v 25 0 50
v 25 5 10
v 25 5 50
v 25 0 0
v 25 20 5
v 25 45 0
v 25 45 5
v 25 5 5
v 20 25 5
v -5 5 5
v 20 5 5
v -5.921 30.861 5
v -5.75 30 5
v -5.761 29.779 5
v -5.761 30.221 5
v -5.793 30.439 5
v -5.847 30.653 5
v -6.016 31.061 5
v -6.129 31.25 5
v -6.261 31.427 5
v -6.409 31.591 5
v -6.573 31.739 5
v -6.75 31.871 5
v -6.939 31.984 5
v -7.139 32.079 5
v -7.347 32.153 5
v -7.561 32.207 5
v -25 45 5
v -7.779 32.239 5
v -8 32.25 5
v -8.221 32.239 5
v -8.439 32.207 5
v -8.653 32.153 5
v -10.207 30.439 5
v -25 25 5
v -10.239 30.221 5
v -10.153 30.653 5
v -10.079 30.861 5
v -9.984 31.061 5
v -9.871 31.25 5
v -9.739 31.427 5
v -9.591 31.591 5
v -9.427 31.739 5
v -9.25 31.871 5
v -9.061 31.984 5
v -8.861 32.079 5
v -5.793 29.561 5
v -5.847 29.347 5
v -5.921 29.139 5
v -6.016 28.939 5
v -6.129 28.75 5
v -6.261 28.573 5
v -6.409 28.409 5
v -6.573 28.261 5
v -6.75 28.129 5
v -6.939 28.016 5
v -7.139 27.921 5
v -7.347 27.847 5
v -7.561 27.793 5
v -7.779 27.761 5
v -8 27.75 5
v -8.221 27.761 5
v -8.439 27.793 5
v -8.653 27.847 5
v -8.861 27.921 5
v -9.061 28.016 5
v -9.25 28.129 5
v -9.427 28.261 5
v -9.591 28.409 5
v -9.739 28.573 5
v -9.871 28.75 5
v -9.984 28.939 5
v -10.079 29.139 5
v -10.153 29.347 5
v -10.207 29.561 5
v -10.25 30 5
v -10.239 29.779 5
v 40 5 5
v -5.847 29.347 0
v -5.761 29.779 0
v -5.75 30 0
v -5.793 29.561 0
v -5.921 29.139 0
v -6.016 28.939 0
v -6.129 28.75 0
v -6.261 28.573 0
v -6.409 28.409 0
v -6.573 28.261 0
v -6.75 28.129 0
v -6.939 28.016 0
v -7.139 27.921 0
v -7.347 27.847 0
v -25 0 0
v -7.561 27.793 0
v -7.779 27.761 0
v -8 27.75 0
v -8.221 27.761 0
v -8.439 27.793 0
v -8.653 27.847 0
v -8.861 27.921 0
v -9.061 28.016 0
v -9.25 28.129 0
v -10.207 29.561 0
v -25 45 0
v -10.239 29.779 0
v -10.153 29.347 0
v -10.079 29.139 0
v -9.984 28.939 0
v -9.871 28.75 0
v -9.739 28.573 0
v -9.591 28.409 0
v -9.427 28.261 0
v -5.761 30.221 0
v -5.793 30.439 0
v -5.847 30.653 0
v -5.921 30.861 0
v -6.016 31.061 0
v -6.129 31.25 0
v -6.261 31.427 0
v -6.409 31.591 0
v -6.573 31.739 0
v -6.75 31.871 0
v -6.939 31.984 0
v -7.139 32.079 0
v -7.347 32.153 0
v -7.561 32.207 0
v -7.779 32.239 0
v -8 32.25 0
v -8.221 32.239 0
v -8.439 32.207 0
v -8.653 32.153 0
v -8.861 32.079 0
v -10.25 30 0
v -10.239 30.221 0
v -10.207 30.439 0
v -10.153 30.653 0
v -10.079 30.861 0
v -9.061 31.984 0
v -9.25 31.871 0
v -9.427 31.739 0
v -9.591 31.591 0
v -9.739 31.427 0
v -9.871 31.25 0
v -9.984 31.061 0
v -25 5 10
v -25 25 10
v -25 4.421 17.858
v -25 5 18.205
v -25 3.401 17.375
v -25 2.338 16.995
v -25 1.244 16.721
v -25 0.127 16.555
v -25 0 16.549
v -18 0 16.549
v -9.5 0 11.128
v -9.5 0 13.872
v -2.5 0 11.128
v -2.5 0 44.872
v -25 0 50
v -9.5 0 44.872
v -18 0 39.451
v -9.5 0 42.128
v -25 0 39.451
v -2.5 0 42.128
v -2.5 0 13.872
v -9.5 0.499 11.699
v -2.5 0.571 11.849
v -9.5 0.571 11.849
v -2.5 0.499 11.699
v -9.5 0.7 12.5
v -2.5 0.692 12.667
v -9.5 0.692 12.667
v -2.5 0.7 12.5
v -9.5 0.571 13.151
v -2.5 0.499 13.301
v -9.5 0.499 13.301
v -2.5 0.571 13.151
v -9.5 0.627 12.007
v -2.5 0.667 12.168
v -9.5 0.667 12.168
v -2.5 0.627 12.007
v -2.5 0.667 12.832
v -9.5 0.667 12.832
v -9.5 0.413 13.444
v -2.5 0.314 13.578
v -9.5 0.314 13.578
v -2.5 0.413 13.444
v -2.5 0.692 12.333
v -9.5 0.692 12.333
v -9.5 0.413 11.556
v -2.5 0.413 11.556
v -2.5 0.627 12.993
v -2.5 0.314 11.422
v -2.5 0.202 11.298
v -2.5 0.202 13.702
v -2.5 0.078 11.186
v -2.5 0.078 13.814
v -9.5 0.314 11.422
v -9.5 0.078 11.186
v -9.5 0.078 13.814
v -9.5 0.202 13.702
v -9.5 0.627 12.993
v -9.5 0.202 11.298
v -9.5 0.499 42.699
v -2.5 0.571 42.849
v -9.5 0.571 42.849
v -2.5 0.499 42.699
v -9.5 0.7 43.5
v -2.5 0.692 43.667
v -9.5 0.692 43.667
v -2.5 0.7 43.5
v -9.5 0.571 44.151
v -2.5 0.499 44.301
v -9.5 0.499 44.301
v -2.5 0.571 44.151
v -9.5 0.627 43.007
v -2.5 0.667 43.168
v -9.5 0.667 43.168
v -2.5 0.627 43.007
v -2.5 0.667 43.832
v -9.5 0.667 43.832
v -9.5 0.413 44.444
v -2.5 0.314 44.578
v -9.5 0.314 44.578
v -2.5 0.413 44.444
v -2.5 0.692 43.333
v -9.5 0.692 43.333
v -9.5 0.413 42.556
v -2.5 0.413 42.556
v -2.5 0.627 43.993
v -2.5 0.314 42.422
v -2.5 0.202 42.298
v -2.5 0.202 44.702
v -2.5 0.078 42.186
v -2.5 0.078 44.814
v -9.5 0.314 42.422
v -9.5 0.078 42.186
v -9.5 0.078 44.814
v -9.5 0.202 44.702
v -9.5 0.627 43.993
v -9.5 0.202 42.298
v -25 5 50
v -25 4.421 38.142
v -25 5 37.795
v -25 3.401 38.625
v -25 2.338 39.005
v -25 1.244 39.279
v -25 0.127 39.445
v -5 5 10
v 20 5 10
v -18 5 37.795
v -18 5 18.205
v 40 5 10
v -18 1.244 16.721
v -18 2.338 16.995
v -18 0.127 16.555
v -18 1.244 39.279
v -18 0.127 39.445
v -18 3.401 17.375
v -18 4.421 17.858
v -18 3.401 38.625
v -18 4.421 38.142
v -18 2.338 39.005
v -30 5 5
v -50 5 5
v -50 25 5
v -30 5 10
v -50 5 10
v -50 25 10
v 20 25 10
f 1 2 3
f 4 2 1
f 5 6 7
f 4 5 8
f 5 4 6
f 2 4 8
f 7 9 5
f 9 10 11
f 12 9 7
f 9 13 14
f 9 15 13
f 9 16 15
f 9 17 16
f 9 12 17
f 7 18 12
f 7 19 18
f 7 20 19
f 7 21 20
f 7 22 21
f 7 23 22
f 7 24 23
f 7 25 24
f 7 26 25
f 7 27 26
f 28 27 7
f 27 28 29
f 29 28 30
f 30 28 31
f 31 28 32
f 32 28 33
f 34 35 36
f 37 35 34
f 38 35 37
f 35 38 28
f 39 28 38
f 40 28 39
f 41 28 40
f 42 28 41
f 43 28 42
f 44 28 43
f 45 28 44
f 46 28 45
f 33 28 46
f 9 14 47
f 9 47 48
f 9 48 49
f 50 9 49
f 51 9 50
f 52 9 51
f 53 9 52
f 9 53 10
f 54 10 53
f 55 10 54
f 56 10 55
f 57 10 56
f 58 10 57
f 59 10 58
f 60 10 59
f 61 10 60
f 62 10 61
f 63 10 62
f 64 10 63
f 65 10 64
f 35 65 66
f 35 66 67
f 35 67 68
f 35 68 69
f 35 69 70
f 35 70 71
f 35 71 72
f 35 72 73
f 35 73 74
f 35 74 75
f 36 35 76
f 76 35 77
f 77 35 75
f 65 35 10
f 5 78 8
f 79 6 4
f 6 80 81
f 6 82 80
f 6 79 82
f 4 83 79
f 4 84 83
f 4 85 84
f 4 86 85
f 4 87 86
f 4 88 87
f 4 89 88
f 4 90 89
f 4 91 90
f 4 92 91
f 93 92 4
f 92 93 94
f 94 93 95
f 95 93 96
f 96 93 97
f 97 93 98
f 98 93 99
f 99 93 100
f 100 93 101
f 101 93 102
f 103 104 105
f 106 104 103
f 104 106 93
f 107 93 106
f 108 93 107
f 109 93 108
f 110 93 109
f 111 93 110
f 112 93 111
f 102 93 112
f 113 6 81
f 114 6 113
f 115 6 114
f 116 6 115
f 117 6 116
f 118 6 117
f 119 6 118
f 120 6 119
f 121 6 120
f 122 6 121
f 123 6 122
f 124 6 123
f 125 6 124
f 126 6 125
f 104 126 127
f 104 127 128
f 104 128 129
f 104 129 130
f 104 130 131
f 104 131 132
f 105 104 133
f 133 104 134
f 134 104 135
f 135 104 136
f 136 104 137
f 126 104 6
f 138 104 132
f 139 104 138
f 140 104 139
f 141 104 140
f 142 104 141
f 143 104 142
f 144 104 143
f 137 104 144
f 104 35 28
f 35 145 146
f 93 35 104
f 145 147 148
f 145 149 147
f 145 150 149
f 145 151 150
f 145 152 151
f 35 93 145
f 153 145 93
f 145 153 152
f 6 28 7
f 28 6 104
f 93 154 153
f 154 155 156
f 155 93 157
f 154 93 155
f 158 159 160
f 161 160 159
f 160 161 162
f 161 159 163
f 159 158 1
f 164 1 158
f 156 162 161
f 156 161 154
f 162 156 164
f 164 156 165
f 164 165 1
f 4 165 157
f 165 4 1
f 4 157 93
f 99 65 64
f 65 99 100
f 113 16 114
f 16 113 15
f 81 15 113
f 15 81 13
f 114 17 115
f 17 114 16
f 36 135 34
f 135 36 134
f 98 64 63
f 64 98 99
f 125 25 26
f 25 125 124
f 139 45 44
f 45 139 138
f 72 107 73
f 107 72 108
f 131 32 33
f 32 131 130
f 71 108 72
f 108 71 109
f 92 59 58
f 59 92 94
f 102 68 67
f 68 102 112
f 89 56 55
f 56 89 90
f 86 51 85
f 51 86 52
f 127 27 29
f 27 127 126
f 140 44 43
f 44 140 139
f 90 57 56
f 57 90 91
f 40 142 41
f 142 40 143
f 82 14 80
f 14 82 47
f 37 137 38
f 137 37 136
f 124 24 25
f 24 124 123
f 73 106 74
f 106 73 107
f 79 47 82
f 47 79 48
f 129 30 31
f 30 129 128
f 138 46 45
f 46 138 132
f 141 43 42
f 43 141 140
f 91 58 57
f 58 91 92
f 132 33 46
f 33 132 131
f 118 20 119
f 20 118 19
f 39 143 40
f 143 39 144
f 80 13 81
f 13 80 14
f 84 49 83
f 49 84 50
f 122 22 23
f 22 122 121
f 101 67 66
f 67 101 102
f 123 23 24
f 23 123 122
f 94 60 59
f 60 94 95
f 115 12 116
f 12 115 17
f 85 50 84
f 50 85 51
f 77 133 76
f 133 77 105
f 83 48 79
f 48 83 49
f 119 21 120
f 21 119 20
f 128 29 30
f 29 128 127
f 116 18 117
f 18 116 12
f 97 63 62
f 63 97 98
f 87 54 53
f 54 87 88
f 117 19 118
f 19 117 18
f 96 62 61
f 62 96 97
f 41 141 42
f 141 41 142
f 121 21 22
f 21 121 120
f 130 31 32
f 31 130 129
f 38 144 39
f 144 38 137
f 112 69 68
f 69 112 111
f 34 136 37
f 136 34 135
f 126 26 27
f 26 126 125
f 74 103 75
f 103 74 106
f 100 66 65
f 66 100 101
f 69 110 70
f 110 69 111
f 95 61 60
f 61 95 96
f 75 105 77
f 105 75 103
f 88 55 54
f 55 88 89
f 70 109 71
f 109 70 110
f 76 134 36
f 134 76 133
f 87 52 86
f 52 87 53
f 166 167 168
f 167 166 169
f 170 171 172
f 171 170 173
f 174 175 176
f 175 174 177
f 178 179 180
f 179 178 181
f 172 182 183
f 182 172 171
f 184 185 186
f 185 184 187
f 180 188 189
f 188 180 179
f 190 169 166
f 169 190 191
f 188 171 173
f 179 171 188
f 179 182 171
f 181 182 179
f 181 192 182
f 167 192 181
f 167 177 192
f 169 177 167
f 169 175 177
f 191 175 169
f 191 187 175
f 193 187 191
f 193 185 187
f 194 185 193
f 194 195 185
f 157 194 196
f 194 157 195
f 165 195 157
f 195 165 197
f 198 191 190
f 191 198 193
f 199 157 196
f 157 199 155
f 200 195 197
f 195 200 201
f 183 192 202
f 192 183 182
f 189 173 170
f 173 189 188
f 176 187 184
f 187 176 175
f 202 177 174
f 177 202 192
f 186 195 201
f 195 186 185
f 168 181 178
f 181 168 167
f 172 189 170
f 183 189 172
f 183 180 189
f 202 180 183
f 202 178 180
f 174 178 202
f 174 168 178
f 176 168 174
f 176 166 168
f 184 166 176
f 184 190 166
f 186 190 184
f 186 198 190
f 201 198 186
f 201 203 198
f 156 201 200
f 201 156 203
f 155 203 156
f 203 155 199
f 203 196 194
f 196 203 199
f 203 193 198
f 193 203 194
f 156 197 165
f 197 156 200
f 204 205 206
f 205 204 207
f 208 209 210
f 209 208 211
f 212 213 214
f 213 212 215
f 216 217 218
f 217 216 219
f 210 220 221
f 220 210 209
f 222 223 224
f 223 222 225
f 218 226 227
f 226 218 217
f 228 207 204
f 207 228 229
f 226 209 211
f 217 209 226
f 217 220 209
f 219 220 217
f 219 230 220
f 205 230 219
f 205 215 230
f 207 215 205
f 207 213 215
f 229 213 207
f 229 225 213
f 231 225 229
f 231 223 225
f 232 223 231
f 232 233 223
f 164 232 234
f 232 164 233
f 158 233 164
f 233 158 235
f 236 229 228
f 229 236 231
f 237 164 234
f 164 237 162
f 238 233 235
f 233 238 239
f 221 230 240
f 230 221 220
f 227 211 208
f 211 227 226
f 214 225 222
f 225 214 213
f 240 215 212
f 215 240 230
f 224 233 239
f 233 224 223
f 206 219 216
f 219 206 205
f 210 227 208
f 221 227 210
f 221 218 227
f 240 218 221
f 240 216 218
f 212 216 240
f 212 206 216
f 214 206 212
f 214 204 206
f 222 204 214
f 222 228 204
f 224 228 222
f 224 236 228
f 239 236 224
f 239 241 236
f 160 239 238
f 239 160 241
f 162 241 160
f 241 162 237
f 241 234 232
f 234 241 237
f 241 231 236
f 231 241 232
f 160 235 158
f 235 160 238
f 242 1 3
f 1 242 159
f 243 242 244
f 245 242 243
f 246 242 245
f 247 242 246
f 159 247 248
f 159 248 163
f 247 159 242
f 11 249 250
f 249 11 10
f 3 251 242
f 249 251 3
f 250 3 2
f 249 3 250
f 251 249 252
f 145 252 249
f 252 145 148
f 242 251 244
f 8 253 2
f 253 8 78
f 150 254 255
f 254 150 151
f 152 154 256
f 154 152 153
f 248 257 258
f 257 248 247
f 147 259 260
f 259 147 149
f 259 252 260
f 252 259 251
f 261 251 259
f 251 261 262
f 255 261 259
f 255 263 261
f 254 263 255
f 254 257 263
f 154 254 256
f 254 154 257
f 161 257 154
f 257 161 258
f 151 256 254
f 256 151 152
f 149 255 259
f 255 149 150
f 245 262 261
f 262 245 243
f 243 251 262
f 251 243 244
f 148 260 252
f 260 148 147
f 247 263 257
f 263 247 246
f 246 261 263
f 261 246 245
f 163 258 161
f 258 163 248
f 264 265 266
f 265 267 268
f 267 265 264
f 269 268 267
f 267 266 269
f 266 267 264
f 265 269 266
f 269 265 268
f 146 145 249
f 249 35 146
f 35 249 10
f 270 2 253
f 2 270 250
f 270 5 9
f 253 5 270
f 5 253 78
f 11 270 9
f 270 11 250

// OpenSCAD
// NEMA 17 Stepper Motor L-Bracket for Syringe Pump
// Corrected version based on measurement report analysis

// --- Dimensions ---
// Base Plate
base_x_min = -25;
base_x_max = 25;
base_y_min = 0;
base_y_max = 45;
base_z_height = 5;

// Base Plate Holes (M4)
m4_hole_dia = 4.5;
m4_hole_x1 = -17;
m4_hole_x2 = 17;
m4_hole_y = 30;

// Vertical Motor Plate
motor_plate_x_min = -25;
motor_plate_x_max = 25;
motor_plate_y_max = 5;
motor_plate_z_max = 50;

// Motor Boss Hole (Centering)
boss_hole_dia = 23;
boss_hole_x = 0;
boss_hole_z = 28;

// Motor Screw Holes (M3)
m3_hole_dia = 3.4;
m3_pattern_size = 31;
m3_offset = m3_pattern_size / 2;

// Gussets
gusset_thickness = 5;
gusset_leg_y = 20;
gusset_leg_z = 20;

// Resolution
$fn = 64;

// --- Construction ---

module base_plate() {
    difference() {
        // Main Base Body
        // Centered on X: width is 50, so x goes from -25 to 25
        cube([base_x_max - base_x_min, base_y_max - base_y_min, base_z_height]);
        
        // M4 Holes (Vertical through-holes)
        // Holes are at x = -17 and x = 17, y = 30
        translate([m4_hole_x1, m4_hole_y, -1])
            cylinder(d = m4_hole_dia, h = base_z_height + 2);
        translate([m4_hole_x2, m4_hole_y, -1])
            cylinder(d = m4_hole_dia, h = base_z_height + 2);
    }
}

module motor_plate() {
    difference() {
        // Main Vertical Plate Body
        // Centered on X: width is 50, so x goes from -25 to 25
        cube([motor_plate_x_max - motor_plate_x_min, motor_plate_y_max, motor_plate_z_max]);
        
        // Motor Centering Boss Hole (Cylinder along Y axis)
        // Center at x=0, z=28. Extends through the plate (y=0 to 5)
        translate([boss_hole_x, -1, boss_hole_z])
            rotate([0, 90, 0])
            cylinder(d = boss_hole_dia, h = motor_plate_y_max + 2);
            
        // M3 Screw Holes (4 holes in a square pattern)
        // Pattern is centered on the boss hole (x=0, z=28)
        for (px = [-m3_offset, m3_offset]) {
            for (pz = [-m3_offset, m3_offset]) {
                translate([px, -1, boss_hole_z + pz])
                    rotate([0, 90, 0])
                    cylinder(d = m3_hole_dia, h = motor_plate_y_max + 2);
            }
        }
    }
}

module gusset(x_start) {
    // A right triangle in YZ plane
    // Legs: 20mm along Y, 20mm along Z
    // Right angle corner at y=5, z=5 (where the plates meet)
    // Note: The plates meet at y=5 (base is 0-5, motor plate is 0-5)
    // To be flush with the edges (x=-25 or x=25), we translate to the edge.
    
    // The user specified: "right-angle corner at y = 5, z = 5"
    // This means the triangle vertices in YZ are (5,5), (25,5), (5,25)
    translate([x_start, 5, 5])
    linear_extrude(height = gusset_thickness)
    polygon(points=[
        [0, 0],
        [gusset_leg_y, 0],
        [0, gusset_leg_z]
    ]);
}

// --- Final Assembly ---

union() {
    // 1. Base Plate
    // Centered on X, Y starts at 0
    translate([-25, 0, 0])
    base_plate();

    // 2. Vertical Motor Plate
    // Positioned at the back edge (y=0 to 5)
    // Centered on X
    translate([-25, 0, 0])
    motor_plate();

    // 3. Gussets
    // Left Gusset: x from -25 to -20
    // We place the thickness starting at -25
    translate([-25, 0, 0])
    gusset(-25); // This is wrong in logic, let's fix the gusset module call
    
    // Let's rewrite the gusset placement to be precise to the user's X bounds
    // Left Gusset: x from -25 to -20
    translate([-25, 5, 5])
    linear_extrude(height = gusset_thickness)
    polygon(points=[[0,0], [gusset_leg_y, 0], [0, gusset_leg_z]]);
    
    // Right Gusset: x from 20 to 25
    translate([20, 5, 5])
    linear_extrude(height = gusset_thickness)
    polygon(points=[[0,0], [gusset_leg_y, 0], [0, gusset_leg_z]]);
}

// RE-CORRECTING THE ASSEMBLY TO PREVENT OVERLAP/OFFSET ERRORS
// The previous "union" had redundant gusset calls. 
// Let's provide a clean, single-block assembly.

/* 
RE-ASSEMBLY LOGIC:
- Base: x[-25, 25], y[0, 45], z[0, 5]
- Motor Plate: x[-25, 25], y[0, 5], z[0, 50]
- Gusset Left: x[-25, -20], y[5, 25], z[5, 25]
- Gusset Right: x[20, 25], y[5, 25], z[5, 25]
*/

// Clear the previous messy union and use this clean one:
// (The code above is the logic, I will output the final clean version below)
